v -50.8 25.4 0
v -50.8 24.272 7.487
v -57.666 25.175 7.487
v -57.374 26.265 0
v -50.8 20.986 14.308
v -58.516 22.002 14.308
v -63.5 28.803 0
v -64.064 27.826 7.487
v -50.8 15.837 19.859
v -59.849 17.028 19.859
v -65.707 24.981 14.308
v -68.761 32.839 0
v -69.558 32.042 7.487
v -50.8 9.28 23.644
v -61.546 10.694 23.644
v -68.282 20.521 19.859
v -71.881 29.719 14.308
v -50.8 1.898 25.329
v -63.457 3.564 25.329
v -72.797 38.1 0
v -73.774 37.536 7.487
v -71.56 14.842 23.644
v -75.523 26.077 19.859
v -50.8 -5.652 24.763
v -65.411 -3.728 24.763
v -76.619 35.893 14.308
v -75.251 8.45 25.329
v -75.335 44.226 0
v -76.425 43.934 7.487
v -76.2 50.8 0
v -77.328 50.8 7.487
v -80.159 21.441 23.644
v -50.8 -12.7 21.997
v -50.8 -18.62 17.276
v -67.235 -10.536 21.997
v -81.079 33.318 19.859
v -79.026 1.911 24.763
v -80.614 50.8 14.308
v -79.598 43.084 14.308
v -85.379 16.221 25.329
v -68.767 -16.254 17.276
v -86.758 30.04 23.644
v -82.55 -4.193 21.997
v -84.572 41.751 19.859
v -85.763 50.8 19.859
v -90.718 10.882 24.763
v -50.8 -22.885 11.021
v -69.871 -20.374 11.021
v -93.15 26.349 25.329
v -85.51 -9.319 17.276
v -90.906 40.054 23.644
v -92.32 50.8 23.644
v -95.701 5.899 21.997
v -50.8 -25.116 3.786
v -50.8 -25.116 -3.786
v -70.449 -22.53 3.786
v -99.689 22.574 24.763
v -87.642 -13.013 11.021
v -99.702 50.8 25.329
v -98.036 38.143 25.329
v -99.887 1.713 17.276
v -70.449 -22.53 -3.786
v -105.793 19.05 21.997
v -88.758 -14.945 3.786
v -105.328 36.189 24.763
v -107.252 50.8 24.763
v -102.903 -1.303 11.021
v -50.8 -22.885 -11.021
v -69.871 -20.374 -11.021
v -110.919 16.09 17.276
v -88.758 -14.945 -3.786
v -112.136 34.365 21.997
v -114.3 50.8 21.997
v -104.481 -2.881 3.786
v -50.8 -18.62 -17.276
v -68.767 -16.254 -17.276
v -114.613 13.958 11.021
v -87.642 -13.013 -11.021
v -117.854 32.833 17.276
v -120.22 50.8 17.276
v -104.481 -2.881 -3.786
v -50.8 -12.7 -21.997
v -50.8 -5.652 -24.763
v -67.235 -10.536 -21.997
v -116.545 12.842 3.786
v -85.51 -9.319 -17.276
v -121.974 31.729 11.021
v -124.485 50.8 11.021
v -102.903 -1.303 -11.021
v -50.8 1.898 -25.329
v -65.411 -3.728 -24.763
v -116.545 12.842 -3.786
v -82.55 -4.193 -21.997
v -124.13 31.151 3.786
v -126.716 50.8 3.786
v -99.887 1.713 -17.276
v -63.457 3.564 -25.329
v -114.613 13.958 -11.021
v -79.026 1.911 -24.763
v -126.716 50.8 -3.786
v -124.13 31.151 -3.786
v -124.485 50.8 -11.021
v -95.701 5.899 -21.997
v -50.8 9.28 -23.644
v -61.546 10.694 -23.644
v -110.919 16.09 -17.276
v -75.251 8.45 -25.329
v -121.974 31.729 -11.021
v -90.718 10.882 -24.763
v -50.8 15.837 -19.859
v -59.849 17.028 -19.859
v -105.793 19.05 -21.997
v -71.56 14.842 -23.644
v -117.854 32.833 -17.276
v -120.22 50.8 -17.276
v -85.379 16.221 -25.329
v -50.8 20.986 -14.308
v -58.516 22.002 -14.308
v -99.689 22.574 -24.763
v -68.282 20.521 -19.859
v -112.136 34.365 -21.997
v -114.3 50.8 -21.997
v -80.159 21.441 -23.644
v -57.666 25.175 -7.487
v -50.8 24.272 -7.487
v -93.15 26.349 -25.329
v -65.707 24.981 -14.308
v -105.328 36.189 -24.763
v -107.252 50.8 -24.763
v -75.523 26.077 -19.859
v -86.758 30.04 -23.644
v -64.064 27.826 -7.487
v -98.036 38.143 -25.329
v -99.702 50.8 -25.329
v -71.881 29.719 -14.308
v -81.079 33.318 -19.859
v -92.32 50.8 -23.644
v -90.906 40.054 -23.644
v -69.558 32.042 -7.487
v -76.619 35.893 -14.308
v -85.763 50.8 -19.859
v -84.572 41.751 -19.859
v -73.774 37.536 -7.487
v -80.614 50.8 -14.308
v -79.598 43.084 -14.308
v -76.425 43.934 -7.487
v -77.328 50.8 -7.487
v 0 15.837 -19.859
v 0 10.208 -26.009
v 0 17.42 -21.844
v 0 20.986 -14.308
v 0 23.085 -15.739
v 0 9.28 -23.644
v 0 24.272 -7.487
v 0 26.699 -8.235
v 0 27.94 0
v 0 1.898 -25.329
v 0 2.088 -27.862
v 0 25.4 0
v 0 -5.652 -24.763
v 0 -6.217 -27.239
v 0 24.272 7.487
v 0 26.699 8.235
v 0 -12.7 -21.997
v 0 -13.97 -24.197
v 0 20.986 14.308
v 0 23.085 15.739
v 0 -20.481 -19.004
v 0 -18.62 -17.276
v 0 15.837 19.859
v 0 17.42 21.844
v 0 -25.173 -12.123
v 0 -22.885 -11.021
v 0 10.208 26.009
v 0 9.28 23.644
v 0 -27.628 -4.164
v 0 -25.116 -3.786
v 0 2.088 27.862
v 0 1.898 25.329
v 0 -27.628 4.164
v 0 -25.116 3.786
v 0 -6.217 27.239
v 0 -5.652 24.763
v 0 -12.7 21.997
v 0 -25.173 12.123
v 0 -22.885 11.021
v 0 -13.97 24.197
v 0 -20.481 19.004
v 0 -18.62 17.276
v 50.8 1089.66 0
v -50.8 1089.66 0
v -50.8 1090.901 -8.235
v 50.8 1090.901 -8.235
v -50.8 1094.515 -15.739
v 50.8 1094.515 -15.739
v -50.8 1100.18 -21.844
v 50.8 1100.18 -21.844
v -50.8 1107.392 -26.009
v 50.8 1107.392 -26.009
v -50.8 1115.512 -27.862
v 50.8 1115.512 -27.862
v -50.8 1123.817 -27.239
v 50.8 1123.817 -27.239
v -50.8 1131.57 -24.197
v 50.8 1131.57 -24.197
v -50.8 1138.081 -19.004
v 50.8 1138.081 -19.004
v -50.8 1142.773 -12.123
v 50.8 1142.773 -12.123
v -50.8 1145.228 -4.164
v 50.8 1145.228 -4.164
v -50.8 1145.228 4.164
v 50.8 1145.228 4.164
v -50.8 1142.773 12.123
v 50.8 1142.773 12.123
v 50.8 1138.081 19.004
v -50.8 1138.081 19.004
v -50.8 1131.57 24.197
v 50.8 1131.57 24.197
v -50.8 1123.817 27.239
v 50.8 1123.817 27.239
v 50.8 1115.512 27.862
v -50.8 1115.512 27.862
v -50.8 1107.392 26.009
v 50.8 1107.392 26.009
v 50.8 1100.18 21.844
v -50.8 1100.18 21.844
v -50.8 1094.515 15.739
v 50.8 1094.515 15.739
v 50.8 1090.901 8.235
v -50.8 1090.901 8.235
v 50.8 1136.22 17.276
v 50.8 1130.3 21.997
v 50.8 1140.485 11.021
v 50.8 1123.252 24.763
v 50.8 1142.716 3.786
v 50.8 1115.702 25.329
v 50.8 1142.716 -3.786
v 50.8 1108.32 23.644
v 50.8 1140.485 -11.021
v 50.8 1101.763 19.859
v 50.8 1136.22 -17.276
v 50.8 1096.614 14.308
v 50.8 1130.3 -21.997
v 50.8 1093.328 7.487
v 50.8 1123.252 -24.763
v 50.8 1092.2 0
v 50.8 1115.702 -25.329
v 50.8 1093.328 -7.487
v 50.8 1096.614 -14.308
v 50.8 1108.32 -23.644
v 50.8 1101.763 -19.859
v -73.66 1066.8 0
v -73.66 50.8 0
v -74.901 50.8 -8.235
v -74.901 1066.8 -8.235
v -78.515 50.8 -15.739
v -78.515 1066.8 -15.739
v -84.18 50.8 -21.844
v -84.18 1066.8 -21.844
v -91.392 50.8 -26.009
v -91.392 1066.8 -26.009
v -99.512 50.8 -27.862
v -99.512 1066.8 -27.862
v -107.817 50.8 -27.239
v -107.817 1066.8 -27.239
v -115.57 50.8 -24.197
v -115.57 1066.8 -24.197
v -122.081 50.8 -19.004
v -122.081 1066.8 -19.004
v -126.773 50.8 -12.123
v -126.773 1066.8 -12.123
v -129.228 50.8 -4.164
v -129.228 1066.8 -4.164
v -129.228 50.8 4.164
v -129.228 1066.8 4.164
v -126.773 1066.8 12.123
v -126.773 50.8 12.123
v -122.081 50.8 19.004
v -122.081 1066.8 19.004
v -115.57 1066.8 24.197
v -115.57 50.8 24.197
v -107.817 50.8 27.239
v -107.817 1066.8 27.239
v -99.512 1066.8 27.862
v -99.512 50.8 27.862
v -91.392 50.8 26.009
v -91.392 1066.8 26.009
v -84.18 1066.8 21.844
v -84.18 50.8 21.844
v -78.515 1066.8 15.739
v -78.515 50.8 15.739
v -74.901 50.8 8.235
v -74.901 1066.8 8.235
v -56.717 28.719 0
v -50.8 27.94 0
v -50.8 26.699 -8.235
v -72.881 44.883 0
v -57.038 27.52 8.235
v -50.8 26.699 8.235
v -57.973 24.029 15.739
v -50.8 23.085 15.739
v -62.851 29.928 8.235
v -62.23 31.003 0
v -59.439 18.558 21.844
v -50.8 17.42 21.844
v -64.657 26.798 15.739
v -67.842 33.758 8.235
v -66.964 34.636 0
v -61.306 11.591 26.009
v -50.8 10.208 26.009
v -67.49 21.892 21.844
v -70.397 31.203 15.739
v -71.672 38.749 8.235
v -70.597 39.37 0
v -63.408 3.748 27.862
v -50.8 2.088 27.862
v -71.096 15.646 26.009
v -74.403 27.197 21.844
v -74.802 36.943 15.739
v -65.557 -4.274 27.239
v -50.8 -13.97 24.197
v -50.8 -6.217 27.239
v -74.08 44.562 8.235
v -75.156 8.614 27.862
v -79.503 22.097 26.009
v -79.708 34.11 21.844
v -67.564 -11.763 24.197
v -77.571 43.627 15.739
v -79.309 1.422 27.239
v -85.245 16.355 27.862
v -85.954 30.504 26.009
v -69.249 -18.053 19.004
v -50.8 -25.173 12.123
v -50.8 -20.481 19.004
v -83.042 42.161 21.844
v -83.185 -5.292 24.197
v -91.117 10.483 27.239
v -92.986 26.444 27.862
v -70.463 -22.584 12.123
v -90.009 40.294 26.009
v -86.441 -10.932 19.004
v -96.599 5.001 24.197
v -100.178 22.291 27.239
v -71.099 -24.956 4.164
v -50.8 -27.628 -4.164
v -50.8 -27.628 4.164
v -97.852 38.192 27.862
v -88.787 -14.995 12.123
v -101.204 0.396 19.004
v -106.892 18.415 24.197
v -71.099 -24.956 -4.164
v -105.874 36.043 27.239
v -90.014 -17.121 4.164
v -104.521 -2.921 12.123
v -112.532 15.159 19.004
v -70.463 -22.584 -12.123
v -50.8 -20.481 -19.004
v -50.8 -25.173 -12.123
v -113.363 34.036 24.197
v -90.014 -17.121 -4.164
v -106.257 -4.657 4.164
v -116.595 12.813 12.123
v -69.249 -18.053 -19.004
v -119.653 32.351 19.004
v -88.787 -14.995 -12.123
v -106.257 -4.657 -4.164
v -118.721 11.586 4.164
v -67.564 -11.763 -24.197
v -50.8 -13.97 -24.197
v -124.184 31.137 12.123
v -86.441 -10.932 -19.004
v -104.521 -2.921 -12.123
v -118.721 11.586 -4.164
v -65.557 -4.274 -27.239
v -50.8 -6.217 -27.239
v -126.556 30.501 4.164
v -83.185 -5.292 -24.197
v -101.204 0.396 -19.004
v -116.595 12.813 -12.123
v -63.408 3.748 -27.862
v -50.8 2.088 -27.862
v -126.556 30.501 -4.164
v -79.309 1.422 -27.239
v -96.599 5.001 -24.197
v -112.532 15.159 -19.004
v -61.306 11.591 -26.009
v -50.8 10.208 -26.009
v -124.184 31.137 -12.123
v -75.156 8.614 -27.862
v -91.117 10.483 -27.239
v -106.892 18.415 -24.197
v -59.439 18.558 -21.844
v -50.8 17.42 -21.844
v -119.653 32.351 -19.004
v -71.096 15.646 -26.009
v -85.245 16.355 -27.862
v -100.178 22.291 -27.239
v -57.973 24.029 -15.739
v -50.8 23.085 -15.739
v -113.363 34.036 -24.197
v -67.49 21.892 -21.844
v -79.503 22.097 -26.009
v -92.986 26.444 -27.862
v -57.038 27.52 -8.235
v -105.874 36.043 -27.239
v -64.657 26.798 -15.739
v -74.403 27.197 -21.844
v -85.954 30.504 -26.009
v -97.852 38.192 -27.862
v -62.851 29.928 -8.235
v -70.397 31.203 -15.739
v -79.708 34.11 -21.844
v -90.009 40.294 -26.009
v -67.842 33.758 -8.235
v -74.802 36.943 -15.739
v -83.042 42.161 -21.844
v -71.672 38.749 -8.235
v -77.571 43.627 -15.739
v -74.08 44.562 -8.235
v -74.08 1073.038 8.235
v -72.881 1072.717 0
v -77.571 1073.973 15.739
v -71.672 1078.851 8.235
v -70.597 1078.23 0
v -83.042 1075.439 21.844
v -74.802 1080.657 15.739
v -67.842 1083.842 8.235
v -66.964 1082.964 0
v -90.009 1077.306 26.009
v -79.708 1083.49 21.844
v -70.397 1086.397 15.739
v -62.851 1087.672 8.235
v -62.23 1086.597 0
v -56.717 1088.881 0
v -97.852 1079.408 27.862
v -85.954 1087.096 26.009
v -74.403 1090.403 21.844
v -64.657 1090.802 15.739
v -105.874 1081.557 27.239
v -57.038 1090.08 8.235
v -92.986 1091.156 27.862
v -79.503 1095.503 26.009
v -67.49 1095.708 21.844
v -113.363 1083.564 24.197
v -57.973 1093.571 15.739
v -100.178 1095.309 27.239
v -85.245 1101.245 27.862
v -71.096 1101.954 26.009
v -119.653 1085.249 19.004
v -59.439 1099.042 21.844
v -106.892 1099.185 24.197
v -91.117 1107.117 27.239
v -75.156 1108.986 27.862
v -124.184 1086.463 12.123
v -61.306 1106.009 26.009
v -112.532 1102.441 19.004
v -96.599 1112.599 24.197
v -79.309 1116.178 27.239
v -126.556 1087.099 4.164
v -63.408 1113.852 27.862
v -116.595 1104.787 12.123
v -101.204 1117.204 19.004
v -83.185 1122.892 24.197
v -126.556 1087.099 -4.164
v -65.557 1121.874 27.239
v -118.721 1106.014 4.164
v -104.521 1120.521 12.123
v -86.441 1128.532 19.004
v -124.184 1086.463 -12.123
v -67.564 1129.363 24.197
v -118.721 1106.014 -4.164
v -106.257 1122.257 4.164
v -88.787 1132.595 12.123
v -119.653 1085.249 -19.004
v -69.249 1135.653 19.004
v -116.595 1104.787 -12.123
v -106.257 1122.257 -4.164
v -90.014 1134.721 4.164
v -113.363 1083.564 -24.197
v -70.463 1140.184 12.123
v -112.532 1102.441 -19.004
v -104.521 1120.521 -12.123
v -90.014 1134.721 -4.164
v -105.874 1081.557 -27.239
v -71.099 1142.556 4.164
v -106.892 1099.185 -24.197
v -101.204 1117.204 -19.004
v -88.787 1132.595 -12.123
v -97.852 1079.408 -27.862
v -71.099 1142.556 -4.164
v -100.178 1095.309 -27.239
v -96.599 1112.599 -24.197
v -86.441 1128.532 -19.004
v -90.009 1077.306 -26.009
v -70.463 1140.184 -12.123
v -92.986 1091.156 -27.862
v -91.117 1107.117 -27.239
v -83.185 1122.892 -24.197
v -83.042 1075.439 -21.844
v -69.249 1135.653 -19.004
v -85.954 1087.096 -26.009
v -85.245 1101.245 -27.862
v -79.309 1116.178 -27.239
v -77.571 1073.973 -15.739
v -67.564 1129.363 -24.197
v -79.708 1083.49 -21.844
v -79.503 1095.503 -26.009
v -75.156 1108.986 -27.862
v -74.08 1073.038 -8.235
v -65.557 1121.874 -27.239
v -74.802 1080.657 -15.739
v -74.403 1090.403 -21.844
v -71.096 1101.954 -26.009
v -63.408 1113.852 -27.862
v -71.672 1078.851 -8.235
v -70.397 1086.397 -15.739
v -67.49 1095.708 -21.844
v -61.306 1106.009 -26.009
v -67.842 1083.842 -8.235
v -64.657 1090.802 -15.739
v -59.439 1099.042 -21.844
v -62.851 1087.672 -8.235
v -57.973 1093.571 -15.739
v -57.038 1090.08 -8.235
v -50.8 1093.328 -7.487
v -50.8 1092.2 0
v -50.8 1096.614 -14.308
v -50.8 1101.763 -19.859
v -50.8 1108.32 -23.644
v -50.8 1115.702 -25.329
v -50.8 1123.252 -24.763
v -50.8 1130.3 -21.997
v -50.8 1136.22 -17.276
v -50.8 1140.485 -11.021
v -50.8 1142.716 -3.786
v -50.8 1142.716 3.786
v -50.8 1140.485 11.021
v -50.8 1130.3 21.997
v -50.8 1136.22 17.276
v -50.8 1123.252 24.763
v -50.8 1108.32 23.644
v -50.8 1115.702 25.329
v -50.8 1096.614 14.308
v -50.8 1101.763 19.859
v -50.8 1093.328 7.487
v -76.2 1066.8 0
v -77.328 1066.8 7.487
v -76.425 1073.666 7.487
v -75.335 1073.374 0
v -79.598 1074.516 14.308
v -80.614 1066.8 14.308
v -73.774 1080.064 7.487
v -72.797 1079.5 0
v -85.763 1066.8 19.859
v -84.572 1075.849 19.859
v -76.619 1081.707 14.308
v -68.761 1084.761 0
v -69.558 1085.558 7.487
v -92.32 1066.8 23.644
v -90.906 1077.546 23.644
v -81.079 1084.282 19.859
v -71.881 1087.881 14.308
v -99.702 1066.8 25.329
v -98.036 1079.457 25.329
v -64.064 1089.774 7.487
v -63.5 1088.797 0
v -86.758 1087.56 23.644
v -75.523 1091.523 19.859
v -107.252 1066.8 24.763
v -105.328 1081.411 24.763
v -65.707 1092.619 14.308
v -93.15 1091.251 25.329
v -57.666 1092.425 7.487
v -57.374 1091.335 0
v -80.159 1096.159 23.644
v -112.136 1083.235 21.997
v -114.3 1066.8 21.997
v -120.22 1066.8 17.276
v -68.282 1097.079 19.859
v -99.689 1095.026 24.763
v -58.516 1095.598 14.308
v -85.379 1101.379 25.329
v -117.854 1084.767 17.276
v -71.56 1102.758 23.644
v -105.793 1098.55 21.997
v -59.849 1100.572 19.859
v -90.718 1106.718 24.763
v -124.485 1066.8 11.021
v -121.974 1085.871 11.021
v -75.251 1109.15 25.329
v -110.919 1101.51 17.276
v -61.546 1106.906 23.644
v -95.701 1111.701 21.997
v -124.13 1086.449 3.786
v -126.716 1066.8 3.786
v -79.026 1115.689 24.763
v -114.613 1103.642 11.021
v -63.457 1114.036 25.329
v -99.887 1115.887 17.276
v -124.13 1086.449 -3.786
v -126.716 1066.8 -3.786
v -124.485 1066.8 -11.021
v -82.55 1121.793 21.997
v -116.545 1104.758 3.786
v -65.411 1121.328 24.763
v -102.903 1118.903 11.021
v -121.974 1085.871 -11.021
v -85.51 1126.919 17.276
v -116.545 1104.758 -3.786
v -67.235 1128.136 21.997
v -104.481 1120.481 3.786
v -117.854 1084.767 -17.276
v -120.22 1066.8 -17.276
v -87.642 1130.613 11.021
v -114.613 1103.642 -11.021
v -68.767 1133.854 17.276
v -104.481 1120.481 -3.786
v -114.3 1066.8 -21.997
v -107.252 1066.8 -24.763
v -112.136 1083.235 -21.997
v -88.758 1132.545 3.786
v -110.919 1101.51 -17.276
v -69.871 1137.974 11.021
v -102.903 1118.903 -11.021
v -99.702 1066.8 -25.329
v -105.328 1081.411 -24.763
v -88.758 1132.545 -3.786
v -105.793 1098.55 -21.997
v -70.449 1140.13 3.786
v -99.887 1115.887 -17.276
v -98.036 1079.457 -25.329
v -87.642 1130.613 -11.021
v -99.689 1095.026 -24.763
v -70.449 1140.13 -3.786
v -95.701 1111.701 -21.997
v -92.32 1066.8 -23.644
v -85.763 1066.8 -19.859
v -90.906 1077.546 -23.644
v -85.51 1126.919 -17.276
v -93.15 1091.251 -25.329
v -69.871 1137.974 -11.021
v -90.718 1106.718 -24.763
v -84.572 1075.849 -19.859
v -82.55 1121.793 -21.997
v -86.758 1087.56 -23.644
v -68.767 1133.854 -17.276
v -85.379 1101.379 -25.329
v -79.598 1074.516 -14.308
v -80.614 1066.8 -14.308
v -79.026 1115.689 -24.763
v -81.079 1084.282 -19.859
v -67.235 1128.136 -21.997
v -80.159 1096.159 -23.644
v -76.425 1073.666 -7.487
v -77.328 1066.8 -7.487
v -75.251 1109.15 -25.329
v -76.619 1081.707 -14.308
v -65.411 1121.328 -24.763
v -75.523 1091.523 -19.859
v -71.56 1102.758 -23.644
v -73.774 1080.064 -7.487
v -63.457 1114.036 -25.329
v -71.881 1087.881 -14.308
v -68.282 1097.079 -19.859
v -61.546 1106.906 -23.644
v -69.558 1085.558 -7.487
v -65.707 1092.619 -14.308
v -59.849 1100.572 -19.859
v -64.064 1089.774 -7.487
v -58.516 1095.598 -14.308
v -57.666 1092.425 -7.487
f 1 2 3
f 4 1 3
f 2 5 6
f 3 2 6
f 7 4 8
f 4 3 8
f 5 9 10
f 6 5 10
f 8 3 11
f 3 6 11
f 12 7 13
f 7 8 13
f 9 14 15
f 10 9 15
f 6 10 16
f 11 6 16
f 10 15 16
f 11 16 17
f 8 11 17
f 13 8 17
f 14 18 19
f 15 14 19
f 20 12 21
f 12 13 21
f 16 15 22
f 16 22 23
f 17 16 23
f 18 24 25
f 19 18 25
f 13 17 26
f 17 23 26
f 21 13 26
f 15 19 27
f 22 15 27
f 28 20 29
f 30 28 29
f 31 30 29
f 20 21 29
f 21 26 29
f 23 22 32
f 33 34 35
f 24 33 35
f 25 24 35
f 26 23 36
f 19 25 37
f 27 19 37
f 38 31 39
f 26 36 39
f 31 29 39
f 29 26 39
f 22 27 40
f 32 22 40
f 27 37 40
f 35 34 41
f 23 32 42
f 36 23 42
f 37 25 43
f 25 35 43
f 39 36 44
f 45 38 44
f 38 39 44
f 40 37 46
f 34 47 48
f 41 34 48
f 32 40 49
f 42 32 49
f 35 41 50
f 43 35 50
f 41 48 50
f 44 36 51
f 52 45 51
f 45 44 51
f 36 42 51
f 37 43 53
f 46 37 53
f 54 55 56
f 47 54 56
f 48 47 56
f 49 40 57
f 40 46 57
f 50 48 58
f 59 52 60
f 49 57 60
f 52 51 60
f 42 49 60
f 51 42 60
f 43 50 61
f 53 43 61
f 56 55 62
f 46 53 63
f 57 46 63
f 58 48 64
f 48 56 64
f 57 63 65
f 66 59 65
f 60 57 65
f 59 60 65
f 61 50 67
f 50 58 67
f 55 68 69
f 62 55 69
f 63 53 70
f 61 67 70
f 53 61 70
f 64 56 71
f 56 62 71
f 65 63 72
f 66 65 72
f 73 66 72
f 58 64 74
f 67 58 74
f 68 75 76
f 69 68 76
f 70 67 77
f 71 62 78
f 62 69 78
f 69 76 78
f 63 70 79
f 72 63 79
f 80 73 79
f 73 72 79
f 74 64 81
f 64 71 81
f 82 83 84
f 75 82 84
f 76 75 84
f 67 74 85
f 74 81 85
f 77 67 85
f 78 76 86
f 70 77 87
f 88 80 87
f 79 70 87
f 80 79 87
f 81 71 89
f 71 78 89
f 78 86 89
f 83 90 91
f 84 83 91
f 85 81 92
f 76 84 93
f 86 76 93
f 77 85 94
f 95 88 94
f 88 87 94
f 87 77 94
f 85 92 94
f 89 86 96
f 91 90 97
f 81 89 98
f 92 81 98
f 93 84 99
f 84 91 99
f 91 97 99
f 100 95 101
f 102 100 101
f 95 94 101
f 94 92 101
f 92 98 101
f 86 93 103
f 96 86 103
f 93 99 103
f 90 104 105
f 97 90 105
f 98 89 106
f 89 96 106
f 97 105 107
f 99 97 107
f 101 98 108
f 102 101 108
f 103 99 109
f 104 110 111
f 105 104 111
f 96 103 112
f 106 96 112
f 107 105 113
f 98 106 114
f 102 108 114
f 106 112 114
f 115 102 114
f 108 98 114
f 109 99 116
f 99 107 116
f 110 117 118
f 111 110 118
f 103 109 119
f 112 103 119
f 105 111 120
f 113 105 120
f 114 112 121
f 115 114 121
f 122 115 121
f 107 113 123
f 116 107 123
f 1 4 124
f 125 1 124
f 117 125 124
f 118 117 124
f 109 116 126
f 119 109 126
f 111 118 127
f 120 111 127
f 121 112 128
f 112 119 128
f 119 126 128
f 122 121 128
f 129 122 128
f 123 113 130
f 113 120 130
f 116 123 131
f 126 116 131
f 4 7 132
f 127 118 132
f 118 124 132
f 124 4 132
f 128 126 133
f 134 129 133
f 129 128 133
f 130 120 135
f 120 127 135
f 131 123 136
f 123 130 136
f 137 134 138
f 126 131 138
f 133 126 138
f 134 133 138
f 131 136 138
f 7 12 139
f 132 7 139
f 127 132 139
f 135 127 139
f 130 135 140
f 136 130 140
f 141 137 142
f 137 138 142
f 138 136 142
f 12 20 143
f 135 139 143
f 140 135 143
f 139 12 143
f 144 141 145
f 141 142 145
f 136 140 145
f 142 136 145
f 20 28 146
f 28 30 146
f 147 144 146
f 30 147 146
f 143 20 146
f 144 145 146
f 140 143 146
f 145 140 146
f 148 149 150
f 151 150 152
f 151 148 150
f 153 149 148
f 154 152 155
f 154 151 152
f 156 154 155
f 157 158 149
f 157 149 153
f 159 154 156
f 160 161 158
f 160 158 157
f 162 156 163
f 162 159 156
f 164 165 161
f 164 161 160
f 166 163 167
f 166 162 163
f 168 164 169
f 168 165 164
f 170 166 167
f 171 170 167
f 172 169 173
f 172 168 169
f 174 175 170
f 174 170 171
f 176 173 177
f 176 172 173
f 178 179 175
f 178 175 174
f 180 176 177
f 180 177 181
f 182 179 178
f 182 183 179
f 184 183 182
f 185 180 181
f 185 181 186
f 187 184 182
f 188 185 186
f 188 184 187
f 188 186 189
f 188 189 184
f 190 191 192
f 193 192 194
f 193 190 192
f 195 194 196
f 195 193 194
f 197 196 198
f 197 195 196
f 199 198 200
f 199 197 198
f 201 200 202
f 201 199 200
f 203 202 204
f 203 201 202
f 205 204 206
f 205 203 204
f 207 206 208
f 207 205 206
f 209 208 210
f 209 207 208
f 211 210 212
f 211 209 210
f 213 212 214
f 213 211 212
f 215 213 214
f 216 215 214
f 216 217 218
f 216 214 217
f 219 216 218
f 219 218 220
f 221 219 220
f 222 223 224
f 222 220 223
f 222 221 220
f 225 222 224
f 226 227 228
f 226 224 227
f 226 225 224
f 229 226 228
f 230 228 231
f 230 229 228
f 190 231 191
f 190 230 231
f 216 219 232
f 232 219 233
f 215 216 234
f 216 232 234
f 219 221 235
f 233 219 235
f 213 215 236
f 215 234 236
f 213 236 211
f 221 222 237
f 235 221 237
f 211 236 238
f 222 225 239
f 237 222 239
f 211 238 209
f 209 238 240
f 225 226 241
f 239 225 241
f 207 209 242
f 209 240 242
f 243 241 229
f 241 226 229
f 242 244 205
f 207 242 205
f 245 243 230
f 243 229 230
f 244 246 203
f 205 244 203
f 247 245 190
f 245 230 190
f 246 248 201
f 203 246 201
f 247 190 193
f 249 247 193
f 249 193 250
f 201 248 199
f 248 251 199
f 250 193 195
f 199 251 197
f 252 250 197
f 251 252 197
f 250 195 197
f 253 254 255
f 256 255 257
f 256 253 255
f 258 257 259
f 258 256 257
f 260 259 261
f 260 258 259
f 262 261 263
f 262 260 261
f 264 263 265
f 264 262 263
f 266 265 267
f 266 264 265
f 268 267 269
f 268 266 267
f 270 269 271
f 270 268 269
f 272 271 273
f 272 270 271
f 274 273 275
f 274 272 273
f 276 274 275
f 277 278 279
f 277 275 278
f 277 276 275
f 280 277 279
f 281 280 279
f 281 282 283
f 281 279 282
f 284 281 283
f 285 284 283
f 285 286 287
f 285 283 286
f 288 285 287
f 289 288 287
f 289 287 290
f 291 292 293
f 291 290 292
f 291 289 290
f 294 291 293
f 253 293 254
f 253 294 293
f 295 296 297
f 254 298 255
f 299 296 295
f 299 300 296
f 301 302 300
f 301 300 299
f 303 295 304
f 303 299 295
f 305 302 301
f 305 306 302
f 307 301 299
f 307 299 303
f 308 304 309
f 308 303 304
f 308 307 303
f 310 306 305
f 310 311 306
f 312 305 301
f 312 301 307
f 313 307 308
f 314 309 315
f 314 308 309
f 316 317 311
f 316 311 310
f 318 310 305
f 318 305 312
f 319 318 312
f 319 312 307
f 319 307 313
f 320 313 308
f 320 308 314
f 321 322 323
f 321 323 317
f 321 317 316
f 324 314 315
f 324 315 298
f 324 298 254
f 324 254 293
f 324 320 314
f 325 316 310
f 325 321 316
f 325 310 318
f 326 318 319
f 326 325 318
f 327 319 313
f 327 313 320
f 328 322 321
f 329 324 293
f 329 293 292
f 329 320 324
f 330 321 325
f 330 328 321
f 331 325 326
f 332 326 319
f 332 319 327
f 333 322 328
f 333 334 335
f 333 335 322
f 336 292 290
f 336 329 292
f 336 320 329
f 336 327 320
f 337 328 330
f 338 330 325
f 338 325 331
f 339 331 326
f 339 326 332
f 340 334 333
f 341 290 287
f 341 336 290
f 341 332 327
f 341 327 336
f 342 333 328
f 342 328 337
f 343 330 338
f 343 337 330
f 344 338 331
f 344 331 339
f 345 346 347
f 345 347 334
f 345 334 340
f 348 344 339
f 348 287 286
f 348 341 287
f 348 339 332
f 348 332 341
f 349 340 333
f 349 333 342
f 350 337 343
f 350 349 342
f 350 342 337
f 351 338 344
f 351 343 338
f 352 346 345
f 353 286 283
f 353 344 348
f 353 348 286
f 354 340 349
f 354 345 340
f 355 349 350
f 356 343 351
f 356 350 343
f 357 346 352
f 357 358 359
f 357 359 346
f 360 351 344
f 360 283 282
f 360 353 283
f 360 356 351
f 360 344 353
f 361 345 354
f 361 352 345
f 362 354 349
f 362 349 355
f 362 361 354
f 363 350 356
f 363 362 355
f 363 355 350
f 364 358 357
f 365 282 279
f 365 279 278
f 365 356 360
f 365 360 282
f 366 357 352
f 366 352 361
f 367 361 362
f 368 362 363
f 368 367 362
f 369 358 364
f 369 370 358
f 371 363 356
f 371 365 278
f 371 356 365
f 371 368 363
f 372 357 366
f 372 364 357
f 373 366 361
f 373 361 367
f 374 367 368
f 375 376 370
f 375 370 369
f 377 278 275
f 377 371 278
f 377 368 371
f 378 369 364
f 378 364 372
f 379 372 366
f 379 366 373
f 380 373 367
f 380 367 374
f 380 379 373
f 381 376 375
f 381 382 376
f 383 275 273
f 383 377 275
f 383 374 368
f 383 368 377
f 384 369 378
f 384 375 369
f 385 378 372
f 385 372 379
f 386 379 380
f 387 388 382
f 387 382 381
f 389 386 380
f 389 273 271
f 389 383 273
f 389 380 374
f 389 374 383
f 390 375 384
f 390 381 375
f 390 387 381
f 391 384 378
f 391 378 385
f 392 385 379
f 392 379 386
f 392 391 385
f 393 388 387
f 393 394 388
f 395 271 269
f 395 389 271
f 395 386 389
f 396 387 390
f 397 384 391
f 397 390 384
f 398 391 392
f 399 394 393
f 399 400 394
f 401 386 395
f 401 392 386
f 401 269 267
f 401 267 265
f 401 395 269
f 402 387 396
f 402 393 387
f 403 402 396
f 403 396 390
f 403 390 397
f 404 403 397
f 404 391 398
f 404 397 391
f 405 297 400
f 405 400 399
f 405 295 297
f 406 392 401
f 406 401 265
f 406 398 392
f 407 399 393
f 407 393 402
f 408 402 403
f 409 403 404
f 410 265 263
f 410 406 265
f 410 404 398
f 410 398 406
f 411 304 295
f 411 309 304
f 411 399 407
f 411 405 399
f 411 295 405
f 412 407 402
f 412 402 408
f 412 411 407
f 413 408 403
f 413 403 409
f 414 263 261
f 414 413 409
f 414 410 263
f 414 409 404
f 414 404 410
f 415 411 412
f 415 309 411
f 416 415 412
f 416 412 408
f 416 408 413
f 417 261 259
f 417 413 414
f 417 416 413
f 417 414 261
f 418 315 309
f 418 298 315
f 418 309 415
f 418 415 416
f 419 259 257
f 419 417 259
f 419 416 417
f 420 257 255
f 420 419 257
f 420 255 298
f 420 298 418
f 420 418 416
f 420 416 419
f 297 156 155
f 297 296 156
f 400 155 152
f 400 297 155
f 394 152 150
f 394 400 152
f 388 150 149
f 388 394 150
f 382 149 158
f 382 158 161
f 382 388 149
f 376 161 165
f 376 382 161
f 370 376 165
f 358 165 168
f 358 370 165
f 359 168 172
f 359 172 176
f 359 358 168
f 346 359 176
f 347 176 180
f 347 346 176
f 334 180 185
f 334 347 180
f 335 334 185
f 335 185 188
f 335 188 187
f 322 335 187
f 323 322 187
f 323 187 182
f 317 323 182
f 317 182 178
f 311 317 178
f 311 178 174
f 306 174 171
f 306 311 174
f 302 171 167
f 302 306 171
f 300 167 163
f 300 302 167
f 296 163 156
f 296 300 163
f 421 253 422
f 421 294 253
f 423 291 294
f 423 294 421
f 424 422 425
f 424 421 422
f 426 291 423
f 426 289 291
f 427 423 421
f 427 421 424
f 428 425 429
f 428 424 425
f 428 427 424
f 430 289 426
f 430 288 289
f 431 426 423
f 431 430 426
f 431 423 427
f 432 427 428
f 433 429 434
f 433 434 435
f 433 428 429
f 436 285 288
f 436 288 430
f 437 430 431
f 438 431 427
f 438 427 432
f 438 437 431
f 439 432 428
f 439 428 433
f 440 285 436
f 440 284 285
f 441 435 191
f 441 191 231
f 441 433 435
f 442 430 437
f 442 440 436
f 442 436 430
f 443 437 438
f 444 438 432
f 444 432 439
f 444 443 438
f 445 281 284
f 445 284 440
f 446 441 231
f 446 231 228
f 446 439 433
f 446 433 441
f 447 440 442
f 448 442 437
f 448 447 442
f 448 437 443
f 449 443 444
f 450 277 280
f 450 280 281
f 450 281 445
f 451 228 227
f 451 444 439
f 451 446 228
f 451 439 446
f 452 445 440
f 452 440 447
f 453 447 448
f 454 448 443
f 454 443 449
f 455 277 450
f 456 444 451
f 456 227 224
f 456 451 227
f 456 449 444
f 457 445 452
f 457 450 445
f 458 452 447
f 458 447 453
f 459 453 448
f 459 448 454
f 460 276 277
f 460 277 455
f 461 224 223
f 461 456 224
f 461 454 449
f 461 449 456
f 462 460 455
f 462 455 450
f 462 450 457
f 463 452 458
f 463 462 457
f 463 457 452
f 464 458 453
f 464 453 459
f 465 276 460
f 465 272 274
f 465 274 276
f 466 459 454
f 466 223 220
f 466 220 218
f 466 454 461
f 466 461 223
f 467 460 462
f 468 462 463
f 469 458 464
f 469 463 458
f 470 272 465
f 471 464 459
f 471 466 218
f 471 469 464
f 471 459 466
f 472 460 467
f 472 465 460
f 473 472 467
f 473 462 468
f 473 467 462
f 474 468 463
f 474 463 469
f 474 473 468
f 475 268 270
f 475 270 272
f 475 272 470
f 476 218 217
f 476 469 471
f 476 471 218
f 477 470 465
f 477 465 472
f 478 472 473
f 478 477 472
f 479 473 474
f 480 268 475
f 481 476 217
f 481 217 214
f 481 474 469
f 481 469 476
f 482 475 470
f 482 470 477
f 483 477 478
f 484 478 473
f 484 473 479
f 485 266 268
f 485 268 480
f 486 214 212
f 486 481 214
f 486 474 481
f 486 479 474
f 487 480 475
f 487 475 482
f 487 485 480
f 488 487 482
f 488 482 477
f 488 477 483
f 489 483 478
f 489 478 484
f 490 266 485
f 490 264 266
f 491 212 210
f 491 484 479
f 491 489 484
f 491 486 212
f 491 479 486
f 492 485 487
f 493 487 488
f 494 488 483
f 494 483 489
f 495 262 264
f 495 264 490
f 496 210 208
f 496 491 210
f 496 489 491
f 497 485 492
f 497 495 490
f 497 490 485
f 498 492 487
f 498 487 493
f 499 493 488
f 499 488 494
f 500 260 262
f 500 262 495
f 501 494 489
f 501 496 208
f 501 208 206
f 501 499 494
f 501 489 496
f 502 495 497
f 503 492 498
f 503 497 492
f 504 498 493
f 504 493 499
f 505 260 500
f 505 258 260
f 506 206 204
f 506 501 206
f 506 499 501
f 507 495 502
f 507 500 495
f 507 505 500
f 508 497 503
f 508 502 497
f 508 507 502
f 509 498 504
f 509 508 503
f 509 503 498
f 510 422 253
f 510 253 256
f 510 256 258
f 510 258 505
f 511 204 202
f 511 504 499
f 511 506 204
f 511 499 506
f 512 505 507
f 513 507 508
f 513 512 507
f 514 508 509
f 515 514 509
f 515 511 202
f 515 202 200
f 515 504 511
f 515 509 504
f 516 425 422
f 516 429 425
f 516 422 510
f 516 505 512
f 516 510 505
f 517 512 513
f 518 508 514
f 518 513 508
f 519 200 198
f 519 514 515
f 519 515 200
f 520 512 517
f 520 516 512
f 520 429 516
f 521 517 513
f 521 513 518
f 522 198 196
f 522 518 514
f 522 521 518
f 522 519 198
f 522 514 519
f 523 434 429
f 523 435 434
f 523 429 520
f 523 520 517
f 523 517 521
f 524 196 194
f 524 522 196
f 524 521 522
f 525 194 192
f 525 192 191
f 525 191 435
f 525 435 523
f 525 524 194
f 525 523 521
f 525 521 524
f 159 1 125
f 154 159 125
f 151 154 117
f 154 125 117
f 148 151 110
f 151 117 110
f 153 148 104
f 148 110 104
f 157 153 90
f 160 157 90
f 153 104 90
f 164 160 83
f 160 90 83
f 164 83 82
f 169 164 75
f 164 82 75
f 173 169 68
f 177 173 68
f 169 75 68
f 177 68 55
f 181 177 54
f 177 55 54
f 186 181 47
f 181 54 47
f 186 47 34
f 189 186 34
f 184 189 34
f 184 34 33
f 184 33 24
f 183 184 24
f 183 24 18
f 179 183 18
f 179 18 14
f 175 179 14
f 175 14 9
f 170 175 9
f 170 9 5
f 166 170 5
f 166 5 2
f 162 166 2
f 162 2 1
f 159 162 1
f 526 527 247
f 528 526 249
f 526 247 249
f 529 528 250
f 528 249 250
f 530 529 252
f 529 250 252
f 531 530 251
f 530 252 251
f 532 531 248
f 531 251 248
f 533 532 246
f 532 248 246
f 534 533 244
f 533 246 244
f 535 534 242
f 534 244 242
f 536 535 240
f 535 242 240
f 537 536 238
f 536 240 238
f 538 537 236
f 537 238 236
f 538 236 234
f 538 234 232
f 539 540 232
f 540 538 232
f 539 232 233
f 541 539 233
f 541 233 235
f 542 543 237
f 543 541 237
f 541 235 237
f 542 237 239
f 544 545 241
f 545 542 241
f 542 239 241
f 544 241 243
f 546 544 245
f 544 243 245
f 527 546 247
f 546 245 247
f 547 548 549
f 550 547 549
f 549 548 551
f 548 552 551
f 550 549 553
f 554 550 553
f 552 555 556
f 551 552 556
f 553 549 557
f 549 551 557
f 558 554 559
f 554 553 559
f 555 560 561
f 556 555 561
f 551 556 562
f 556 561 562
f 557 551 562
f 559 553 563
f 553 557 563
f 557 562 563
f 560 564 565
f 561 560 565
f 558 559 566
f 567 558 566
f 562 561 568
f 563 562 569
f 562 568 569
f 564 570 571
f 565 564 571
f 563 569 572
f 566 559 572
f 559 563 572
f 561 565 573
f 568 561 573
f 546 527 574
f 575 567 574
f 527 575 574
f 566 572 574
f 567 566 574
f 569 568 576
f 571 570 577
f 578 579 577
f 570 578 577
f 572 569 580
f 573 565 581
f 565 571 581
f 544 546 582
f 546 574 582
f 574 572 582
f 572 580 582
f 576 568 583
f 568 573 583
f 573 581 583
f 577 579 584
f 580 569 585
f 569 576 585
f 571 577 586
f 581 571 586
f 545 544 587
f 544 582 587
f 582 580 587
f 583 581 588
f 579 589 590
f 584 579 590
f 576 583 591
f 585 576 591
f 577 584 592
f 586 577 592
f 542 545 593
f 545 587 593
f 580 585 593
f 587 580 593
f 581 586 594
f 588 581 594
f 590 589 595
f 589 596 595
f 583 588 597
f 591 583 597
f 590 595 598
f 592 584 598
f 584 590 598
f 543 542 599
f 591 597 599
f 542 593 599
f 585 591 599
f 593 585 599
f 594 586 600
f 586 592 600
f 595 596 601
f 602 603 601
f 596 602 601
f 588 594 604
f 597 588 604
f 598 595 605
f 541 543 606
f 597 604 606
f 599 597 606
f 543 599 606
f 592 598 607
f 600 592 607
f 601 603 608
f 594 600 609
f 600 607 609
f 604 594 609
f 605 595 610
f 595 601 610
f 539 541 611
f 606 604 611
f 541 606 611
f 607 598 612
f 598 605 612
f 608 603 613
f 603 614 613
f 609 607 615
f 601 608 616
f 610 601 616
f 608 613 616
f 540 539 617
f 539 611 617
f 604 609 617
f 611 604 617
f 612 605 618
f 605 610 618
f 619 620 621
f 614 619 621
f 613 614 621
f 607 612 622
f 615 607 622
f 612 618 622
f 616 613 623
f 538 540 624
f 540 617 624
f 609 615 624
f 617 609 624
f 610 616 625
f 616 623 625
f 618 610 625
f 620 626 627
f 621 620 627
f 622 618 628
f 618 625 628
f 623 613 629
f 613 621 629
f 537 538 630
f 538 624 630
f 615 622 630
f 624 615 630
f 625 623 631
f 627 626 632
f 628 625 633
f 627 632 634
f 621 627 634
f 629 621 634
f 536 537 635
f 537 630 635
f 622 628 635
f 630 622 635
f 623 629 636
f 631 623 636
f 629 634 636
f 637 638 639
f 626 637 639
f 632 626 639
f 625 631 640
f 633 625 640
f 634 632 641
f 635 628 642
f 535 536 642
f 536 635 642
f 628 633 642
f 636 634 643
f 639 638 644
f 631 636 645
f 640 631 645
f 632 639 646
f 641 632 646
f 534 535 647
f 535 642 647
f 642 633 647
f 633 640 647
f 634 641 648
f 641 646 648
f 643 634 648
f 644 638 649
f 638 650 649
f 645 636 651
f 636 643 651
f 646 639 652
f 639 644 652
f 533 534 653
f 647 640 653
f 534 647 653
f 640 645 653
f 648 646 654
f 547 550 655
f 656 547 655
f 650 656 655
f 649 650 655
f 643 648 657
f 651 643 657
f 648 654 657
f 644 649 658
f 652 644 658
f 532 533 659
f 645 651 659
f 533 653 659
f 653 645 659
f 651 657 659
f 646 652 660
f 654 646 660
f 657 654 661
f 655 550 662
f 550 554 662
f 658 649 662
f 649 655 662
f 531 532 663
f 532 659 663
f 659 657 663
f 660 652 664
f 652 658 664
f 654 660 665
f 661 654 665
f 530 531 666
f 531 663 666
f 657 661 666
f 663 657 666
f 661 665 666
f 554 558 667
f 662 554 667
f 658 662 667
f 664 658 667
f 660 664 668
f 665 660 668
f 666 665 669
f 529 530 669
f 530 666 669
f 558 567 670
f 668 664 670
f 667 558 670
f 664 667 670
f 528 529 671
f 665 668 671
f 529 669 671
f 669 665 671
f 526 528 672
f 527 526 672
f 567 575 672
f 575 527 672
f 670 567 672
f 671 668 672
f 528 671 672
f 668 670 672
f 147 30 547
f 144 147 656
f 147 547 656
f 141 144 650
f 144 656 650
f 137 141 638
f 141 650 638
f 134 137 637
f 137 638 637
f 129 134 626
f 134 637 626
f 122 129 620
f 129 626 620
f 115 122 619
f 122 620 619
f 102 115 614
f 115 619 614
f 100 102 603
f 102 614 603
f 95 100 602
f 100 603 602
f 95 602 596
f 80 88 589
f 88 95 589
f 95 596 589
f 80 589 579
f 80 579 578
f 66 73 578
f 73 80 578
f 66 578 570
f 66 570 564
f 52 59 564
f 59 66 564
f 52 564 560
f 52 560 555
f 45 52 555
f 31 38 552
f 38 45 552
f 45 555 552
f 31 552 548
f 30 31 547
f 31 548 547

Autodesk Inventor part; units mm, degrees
ref_plane "YZ Plane" through (0, 0, 0) normal (1, 0, 0) x (0, 1, 0)
ref_plane "XZ Plane" through (0, 0, 0) normal (0, 1, 0) x (-1, 0, 0)
ref_plane "XY Plane" through (0, 0, 0) normal (0, 0, 1) x (1, 0, 0)
sketch "Sketch2" plane through (0, 0, 0) normal (0, 0, 1) x (1, 0, 0)
  line L0 (0, 0) -> (-50.8, 0)
  line L1 (-101.6, 50.8) -> (-101.6, 1066.8)
  line L2 (-50.8, 1117.6) -> (50.8, 1117.6)
  arc A0 (-50.8, 1117.6) -> (-101.6, 1066.8) centre (-50.8, 1066.8) ccw
  arc A1 (-101.6, 50.8) -> (-50.8, 0) centre (-50.8, 50.8) ccw
  point P0 (0, 1117.6)
  dimension "d1" = 50.8
  dimension "d3" = 1016
  dimension "d6" = 101.6
  dimension "d7" = 101.6
  dimension "d8" = 50.8
  dimension "d9" = 1117.6
  dimension "d10" = 50.8
  dimension "d11" = 50.8
  dimension "d12" = 50.8
sketch "Sketch3" plane through (0, 0, 0) normal (1, 0, 0) x (0, 1, 0)
  circle A0 centre (0, 0) radius 27.94
  dimension "d13" = 55.88
sweep "Sweep1" add profiles "Sketch3" path "Sketch2"
shell "Shell1" thickness 2.54 removed faces 2 at (0, -1.1226, -9.2454) at (50.8, 1125.8465, -0.1295)
properties part number "connector2"
